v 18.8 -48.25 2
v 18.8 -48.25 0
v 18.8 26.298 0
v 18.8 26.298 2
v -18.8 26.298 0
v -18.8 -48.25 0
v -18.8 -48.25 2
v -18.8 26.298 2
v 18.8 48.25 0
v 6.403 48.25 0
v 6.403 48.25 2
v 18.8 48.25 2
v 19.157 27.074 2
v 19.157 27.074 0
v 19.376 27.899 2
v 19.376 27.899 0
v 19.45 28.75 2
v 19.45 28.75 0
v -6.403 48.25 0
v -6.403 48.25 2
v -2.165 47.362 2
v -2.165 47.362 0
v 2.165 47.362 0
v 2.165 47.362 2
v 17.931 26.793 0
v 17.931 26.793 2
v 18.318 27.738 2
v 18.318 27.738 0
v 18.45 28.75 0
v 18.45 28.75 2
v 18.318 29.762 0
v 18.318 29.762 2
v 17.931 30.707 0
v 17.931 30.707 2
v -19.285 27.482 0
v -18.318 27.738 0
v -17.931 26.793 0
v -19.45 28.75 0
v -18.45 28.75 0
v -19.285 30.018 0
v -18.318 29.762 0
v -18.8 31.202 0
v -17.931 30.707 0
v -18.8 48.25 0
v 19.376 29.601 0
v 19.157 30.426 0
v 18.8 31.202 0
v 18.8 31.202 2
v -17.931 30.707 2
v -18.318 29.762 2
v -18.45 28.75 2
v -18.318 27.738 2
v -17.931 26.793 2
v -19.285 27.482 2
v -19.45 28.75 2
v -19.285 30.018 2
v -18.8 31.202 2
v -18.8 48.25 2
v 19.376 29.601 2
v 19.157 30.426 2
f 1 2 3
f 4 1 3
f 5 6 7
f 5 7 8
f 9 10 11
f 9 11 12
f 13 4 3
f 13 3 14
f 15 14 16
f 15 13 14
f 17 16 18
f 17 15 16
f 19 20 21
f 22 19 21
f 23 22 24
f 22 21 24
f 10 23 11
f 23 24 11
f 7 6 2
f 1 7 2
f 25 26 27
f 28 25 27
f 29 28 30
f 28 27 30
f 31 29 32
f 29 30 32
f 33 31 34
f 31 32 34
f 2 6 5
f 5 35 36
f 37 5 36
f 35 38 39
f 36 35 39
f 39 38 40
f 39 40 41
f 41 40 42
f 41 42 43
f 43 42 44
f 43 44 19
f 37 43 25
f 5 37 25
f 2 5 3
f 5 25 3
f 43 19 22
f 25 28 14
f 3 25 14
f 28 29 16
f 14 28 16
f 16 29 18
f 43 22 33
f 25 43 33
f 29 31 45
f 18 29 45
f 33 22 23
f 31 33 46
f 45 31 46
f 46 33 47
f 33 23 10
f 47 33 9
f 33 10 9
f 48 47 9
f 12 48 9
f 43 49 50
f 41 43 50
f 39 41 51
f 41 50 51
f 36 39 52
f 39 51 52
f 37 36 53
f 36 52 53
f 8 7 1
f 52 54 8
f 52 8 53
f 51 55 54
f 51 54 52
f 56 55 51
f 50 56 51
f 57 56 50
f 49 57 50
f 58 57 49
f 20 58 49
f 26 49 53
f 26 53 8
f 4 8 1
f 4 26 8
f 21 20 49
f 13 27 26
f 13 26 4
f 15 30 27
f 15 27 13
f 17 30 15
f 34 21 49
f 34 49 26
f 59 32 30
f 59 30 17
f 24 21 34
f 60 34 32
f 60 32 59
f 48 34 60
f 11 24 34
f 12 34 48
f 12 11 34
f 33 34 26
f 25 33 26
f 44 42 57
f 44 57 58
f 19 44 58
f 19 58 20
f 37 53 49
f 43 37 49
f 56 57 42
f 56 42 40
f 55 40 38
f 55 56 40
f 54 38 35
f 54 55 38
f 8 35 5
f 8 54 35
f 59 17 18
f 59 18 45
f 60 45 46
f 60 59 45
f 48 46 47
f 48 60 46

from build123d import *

# Parameters (mm, degrees)
F0_W     = 37.6
F0_H     = 96.5
F1_DEPTH = 2
F3_DEPTH = 2
F5_DEPTH = 2.001


with BuildPart() as f1:
    # F0 (on Top) → F1 (new body)
    with BuildSketch(Plane.XY):
        Rectangle(F0_W, F0_H)
    extrude(amount=F1_DEPTH)

    # F2 (on face) → F3 (join, through all)
    with BuildSketch(Plane.XY.offset(2)):
        with BuildLine():
            Line((-18.8, 26.297960033), (-18.8, 31.202039967))
            ThreePointArc((-18.8, 31.202039967), (-19.45, 28.75), (-18.8, 26.297960033))
        make_face()
        with BuildLine():
            ThreePointArc((19.45, 28.75), (19.2847413723, 30.0183650894), (18.8, 31.202039967))
            Line((18.8, 31.202039967), (18.8, 26.297960033))
            ThreePointArc((18.8, 26.297960033), (19.2847413723, 27.4816349106), (19.45, 28.75))
        make_face()
    extrude(amount=-F3_DEPTH)

    # F4 (on face) → F5 (cut, through all)
    with BuildSketch(Plane.XY.offset(2)):
        with BuildLine():
            Line((-17.9313131313, 26.7933216425), (-17.9313131313, 30.7066783575))
            ThreePointArc((-17.9313131313, 30.7066783575), (-18.45, 28.75), (-17.9313131313, 26.7933216425))
        make_face()
        with BuildLine():
            Line((17.9313131313, 30.7066783575), (17.9313131313, 26.7933216425))
            ThreePointArc((17.9313131313, 26.7933216425), (18.45, 28.75), (17.9313131313, 30.7066783575))
        make_face()
        with BuildLine():
            Line((6.4031242374, 48.25), (-6.4031242374, 48.25))
            ThreePointArc((-6.4031242374, 48.25), (0, 47.25), (6.4031242374, 48.25))
        make_face()
    extrude(amount=-F5_DEPTH, mode=Mode.SUBTRACT)


solid = f1.part
